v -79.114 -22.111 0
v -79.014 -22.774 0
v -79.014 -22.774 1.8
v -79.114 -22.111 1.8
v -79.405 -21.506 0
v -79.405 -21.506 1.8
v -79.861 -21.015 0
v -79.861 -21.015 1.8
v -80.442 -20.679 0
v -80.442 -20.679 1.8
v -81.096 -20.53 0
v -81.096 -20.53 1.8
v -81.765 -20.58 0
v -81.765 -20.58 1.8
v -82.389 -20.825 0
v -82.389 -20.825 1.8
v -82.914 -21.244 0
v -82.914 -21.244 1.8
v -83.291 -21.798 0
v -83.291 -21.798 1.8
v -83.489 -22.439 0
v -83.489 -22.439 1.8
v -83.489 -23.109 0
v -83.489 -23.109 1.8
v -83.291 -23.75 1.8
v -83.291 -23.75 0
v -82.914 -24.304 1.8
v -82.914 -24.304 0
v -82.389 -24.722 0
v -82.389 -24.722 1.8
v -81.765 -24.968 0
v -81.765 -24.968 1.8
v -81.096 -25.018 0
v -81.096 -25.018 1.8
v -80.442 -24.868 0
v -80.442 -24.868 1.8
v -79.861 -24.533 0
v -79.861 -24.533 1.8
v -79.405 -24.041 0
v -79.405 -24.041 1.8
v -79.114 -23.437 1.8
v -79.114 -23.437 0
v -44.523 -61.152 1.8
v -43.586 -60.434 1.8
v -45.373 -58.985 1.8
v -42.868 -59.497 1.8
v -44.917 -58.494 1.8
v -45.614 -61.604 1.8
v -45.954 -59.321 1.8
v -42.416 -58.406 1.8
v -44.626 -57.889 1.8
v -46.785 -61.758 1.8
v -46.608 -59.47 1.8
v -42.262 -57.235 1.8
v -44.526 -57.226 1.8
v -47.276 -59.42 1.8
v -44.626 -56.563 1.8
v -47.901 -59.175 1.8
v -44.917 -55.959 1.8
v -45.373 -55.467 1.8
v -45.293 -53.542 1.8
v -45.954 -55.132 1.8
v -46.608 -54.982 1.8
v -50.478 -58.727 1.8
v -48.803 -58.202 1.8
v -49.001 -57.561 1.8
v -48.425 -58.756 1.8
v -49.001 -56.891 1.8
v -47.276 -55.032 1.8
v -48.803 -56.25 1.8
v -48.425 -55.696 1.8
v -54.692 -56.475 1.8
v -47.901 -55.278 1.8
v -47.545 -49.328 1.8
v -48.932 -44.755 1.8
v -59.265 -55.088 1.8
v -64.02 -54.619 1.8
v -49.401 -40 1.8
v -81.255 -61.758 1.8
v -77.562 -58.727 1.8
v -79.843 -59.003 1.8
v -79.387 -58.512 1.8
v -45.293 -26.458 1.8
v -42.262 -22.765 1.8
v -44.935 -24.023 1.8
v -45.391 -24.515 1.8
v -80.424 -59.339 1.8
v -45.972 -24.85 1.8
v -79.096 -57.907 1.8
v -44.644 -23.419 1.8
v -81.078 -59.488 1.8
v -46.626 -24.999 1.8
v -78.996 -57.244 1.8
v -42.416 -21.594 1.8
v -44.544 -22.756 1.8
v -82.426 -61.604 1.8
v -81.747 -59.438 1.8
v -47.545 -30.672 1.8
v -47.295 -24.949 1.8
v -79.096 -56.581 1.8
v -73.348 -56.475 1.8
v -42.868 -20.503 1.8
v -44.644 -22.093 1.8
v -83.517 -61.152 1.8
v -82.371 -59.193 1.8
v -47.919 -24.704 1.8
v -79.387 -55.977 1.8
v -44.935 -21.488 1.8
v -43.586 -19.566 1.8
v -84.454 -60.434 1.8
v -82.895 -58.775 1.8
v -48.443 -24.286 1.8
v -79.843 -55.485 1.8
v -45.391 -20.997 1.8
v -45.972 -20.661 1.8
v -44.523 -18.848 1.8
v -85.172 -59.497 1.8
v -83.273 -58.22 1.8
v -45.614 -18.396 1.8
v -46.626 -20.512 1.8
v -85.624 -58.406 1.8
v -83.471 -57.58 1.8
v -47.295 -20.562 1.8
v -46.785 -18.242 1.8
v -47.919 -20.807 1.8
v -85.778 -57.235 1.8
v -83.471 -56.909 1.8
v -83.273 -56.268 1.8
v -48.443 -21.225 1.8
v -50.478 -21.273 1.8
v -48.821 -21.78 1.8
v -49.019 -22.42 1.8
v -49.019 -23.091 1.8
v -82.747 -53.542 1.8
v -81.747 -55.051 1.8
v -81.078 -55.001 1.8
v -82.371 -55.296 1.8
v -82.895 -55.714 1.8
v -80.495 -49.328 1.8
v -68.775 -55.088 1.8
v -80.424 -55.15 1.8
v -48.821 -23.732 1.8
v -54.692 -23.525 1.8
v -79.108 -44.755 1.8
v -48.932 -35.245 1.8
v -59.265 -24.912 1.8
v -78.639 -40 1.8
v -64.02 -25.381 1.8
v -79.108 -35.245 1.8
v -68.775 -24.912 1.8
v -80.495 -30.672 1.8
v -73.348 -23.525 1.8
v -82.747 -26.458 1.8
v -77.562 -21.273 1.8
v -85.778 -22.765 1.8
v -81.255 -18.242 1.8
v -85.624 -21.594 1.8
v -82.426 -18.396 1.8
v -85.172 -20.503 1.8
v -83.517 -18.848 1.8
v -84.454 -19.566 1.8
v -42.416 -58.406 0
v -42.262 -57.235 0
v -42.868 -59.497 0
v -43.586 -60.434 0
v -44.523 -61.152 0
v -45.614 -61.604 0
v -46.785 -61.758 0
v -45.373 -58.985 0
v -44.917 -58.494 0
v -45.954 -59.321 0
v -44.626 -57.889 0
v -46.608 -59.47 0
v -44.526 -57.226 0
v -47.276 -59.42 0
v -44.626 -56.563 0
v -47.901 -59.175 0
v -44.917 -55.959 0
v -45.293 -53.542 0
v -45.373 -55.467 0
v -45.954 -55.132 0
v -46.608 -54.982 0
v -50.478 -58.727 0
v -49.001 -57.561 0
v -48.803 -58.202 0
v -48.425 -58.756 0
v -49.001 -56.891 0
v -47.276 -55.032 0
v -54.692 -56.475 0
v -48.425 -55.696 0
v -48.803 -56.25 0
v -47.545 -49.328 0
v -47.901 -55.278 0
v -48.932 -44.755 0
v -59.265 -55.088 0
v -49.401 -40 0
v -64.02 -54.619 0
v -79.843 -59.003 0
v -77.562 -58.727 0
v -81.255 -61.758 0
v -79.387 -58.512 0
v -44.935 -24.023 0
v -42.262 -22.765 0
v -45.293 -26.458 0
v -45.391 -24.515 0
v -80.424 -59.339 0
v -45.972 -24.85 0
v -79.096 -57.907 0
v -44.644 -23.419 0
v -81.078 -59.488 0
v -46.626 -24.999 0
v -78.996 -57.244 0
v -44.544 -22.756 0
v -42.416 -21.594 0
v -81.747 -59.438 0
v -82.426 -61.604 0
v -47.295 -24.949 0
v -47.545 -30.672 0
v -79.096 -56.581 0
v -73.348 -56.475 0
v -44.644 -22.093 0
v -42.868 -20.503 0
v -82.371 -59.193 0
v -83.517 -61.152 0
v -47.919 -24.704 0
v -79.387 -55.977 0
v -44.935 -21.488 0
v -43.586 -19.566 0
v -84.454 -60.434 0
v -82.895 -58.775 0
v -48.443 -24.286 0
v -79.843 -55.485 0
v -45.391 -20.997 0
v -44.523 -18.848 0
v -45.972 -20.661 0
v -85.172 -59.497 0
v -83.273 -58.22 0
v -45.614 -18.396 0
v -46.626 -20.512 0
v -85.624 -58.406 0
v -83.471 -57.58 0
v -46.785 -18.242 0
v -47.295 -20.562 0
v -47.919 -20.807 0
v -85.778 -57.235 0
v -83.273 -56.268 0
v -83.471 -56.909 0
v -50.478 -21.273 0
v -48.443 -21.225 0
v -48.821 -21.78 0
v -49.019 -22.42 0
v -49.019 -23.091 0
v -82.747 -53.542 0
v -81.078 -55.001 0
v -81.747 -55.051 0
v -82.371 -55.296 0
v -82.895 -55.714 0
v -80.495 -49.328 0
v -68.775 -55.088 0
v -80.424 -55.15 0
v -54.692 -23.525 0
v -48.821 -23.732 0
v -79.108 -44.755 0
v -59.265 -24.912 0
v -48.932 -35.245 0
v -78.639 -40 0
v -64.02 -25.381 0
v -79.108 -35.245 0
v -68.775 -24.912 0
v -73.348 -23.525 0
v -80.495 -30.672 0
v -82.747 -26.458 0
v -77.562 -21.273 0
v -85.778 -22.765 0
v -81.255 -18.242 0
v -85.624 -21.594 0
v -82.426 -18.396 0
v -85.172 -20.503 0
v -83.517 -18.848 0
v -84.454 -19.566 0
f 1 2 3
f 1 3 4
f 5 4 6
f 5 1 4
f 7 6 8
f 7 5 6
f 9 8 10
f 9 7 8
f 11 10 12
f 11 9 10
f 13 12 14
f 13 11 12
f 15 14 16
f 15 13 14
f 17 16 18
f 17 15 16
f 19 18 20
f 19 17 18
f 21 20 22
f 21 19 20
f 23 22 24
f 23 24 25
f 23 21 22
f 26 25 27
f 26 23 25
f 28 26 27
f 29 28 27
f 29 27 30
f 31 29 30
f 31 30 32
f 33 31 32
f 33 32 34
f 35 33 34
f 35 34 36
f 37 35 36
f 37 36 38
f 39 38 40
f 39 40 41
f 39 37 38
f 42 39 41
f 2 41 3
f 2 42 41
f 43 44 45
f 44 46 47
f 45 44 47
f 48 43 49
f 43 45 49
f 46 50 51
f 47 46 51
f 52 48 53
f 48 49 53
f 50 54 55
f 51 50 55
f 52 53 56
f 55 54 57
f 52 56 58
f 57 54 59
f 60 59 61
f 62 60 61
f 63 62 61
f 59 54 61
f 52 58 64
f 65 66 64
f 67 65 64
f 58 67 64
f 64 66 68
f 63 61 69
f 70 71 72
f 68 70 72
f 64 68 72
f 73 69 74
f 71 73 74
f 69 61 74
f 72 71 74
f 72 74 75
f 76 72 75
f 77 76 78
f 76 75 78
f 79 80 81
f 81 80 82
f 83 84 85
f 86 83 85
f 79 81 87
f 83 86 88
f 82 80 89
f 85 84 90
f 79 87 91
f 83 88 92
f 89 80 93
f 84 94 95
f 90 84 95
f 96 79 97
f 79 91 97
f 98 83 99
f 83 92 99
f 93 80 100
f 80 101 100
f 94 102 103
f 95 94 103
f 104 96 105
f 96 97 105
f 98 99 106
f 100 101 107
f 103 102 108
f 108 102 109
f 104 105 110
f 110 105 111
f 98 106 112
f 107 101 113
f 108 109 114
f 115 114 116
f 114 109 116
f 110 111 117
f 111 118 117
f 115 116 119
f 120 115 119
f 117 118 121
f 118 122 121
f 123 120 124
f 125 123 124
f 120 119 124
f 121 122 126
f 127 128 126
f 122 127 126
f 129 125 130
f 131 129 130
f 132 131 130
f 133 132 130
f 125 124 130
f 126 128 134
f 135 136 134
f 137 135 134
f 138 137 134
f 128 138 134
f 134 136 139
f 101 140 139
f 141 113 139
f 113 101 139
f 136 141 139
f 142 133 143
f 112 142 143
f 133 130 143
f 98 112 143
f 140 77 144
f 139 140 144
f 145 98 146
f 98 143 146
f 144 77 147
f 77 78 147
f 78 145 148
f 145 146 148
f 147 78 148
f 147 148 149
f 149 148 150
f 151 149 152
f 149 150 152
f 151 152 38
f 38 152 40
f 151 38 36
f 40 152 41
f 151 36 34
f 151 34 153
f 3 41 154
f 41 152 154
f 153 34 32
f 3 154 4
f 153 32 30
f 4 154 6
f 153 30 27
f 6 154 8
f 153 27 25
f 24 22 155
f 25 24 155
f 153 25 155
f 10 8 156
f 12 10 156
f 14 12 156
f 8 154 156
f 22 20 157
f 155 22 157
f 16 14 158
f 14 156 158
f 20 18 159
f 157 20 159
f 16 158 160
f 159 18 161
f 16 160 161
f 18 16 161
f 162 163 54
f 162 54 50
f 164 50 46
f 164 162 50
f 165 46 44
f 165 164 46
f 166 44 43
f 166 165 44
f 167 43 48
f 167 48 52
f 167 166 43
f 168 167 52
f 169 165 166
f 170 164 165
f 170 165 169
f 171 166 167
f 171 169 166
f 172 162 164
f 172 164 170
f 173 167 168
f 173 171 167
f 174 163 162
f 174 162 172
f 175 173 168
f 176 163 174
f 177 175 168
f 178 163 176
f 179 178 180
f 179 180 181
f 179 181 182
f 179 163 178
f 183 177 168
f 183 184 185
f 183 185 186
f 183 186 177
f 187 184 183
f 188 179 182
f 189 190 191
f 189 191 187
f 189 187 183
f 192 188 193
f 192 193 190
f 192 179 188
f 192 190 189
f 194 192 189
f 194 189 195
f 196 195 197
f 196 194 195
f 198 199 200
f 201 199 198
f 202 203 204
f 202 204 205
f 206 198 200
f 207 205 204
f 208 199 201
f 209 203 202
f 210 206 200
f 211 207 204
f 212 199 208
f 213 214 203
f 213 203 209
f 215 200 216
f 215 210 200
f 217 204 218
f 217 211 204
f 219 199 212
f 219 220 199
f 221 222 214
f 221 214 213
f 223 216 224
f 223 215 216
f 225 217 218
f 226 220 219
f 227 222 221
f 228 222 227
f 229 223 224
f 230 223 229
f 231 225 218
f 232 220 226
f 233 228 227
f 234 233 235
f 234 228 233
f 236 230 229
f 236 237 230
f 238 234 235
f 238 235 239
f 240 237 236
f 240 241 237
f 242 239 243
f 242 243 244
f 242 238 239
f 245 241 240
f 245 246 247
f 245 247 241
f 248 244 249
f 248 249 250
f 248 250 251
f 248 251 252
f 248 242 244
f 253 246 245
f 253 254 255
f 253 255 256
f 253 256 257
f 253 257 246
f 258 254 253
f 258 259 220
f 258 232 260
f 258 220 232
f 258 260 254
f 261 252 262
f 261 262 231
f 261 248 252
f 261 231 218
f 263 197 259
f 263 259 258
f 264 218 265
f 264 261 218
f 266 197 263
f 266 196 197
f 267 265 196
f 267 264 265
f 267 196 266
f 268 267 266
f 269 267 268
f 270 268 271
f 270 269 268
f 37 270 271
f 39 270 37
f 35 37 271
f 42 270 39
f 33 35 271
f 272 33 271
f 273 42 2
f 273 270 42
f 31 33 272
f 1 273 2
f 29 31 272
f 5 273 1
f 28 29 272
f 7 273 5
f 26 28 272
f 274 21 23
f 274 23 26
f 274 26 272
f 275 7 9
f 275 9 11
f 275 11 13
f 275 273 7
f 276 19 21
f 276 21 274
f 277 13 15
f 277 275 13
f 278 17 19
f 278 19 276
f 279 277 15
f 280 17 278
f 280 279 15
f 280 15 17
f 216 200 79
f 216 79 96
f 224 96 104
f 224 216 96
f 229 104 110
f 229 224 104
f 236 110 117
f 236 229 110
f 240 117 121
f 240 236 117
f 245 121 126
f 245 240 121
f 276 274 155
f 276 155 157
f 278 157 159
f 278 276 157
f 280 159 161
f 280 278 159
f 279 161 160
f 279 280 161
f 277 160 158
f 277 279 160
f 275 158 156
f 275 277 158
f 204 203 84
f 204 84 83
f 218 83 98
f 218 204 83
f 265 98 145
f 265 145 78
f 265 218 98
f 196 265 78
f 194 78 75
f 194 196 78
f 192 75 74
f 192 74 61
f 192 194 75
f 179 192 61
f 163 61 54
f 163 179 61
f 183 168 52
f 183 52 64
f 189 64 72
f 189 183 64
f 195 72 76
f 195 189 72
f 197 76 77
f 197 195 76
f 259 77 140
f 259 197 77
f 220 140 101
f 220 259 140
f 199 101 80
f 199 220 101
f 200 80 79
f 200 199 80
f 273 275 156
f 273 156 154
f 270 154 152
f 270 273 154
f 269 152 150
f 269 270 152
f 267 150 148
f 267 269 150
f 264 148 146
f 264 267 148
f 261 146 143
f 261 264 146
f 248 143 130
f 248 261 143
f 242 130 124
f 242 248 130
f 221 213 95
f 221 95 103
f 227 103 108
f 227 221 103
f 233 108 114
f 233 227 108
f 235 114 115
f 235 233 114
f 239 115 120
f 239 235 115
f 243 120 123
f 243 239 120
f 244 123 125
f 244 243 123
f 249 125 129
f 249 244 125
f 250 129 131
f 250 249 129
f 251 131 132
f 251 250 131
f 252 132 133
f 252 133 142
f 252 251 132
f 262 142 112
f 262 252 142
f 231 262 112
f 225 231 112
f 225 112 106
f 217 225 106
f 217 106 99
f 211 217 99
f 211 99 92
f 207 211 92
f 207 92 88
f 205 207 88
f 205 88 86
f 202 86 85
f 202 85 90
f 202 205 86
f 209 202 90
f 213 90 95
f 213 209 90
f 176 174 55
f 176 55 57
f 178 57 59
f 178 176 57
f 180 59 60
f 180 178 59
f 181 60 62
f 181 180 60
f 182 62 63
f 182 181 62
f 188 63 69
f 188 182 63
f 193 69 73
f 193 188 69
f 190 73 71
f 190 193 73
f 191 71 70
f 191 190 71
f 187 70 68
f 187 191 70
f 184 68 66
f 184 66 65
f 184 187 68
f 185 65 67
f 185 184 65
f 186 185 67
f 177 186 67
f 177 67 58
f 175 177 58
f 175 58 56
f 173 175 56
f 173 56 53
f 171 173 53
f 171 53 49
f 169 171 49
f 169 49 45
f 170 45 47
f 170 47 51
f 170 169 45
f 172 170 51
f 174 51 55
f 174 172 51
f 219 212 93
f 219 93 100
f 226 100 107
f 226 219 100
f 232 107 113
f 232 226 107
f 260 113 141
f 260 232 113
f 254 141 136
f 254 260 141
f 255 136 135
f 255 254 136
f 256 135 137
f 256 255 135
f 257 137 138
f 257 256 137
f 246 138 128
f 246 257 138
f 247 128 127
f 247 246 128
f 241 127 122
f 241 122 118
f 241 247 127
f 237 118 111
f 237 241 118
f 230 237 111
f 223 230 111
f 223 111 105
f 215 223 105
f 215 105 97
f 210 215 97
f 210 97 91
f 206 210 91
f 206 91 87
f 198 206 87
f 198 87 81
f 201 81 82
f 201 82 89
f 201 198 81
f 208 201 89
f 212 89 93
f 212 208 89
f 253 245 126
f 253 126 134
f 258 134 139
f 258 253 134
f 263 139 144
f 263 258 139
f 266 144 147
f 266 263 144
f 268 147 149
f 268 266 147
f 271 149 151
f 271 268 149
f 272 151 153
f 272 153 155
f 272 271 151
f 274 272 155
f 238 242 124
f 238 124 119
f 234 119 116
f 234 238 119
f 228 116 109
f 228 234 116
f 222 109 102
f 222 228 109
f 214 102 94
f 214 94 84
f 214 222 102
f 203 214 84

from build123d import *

# Parameters (mm, degrees)
MODEL_R             = 2.25
BOSS_EXTRUDE1_DEPTH = 1.8


with BuildPart() as part:
    # Model → Boss-Extrude1 (new body)
    with BuildSketch(Plane.XY):
        with BuildLine():
            ThreePointArc((-81.255144817, -18.241548457), (-64.020000155, -25.380579125), (-46.784855492, -18.241548457))
            ThreePointArc((-46.784855492, -18.241548457), (-43.586394524, -19.566394369), (-42.261548612, -22.764855338))
            ThreePointArc((-42.261548612, -22.764855338), (-49.40057928, -40), (-42.261548612, -57.235144662))
            ThreePointArc((-42.261548612, -57.235144662), (-43.586394524, -60.433605631), (-46.784855493, -61.758451543))
            ThreePointArc((-46.784855493, -61.758451543), (-64.020000155, -54.619420875), (-81.255144817, -61.758451543))
            ThreePointArc((-81.255144817, -61.758451543), (-84.453605786, -60.433605631), (-85.778451698, -57.235144662))
            ThreePointArc((-85.778451698, -57.235144662), (-78.639421029, -40), (-85.778451698, -22.764855338))
            ThreePointArc((-85.778451698, -22.764855338), (-84.453605786, -19.566394369), (-81.255144817, -18.241548457))
        make_face()
        with Locations((-81.264218317, -22.773928838)):
            Circle(MODEL_R, mode=Mode.SUBTRACT)
        with Locations((-81.246071317, -57.244218163)):
            Circle(MODEL_R, mode=Mode.SUBTRACT)
        with Locations((-46.775781992, -57.226071162)):
            Circle(MODEL_R, mode=Mode.SUBTRACT)
        with Locations((-46.793928993, -22.755781837)):
            Circle(MODEL_R, mode=Mode.SUBTRACT)
    extrude(amount=BOSS_EXTRUDE1_DEPTH)


solid = part.part
